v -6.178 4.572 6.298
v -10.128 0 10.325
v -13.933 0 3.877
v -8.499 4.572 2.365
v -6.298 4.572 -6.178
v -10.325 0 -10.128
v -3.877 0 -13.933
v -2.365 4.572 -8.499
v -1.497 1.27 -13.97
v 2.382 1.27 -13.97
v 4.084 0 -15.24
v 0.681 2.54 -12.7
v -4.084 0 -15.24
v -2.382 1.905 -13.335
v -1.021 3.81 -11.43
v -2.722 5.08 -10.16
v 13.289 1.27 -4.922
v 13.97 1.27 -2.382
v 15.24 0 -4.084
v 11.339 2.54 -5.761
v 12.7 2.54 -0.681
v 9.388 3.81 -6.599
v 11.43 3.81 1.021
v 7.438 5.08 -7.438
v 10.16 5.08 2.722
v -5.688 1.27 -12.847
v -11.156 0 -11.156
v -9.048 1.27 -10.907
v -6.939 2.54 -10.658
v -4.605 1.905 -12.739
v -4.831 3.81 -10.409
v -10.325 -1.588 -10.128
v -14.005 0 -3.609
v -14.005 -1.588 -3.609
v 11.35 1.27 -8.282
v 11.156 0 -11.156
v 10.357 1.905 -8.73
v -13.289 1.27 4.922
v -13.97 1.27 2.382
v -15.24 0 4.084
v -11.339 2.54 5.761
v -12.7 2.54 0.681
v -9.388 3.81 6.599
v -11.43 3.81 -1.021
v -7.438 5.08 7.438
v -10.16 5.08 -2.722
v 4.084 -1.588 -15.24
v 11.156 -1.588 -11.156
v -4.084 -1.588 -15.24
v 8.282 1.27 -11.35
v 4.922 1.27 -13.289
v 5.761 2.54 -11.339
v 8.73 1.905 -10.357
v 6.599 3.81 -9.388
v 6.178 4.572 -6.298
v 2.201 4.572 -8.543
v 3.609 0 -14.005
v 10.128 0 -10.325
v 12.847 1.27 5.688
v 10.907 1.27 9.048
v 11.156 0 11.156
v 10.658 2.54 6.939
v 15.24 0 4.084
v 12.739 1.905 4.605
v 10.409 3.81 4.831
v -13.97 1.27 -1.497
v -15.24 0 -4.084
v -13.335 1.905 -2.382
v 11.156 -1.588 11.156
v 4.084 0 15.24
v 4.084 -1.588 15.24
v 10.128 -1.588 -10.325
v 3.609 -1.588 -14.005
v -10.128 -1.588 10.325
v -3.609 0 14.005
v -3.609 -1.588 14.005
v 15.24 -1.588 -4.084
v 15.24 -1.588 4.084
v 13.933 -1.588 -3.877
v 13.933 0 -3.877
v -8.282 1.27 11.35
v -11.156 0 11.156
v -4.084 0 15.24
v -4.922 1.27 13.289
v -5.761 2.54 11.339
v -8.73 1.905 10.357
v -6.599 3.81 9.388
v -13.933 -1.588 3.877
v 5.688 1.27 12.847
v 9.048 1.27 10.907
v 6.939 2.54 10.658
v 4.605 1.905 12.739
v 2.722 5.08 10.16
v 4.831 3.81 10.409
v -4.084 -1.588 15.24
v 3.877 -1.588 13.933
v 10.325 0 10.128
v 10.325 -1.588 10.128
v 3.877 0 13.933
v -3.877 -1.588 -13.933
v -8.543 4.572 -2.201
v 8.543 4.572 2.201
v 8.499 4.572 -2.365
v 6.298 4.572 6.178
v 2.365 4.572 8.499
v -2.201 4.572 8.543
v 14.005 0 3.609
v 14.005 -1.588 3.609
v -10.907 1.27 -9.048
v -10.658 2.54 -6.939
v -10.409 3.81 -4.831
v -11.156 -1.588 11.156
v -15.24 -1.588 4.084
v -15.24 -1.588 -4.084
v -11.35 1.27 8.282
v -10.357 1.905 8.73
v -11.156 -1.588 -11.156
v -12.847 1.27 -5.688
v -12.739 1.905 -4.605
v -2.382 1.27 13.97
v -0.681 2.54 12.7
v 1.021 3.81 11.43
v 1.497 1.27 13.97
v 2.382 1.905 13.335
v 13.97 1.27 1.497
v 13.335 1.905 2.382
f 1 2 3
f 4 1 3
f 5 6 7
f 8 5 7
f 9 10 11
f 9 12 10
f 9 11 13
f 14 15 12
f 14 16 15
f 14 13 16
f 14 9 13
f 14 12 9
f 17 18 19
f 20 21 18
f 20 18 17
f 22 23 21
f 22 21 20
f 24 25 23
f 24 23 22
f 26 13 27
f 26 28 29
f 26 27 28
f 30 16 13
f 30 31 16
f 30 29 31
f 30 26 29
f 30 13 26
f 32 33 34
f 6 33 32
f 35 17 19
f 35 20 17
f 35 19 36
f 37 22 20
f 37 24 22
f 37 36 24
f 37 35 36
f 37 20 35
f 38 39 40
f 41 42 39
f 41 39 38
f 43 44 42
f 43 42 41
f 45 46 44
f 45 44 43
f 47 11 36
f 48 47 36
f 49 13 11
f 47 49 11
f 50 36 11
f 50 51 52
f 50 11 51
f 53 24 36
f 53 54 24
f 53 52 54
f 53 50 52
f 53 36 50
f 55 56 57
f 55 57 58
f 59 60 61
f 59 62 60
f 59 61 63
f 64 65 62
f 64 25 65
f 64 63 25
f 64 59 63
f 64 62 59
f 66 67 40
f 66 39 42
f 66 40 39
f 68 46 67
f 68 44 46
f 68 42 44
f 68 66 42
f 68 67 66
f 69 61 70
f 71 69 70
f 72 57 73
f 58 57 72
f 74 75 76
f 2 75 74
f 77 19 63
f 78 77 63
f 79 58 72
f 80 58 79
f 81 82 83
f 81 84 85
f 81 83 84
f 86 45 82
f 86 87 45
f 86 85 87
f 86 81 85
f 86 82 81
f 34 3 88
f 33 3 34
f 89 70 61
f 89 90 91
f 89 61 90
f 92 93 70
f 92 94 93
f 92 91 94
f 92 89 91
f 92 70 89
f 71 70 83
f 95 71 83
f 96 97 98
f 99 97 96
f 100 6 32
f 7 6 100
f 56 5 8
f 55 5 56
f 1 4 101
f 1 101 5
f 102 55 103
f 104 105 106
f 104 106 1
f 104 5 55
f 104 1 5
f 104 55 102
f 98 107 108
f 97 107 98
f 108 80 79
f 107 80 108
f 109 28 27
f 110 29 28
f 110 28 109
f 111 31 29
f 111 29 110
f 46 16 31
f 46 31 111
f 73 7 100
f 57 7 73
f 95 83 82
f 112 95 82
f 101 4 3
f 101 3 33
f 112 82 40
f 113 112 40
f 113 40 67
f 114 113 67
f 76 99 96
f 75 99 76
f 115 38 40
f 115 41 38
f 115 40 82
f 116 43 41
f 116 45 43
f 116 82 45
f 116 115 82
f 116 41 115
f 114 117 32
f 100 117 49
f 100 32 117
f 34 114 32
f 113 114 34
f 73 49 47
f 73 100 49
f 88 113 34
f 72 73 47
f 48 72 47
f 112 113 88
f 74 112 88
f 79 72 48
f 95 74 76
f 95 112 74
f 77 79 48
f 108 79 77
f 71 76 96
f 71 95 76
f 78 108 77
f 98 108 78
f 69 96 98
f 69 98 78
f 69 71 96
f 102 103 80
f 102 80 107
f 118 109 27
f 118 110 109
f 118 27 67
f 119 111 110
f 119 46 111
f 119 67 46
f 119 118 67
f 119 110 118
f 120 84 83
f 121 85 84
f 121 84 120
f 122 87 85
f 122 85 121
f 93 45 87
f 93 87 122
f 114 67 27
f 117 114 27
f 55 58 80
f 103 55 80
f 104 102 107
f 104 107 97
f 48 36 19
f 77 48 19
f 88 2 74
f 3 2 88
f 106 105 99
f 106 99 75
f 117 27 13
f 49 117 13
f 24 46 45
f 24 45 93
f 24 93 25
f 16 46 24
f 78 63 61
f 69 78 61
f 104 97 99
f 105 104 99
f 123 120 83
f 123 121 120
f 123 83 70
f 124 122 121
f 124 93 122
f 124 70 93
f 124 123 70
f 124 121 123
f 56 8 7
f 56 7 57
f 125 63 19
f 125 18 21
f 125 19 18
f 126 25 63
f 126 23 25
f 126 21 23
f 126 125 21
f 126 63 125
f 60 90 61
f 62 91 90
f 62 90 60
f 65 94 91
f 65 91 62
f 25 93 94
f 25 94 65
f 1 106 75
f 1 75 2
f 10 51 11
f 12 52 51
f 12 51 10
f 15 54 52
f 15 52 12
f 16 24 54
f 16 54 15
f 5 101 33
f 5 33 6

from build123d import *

# Parameters (mm, degrees)
BOSS_EXTRUDE2_DEPTH = 5.08
BOSS_EXTRUDE2_TAPER = 45
CUT_EXTRUDE1_DEPTH  = 28.788825452
CIRPATTERN1_COUNT   = 6
CUT_EXTRUDE2_DEPTH  = 4.572
CUT_EXTRUDE2_DRAFT  = -50
BOSS_EXTRUDE3_DEPTH = 1.5875


with BuildPart() as part:
    # Sketch2 → Boss-Extrude2 (new body)
    with BuildSketch(Plane(origin=(0, 0, 0), x_dir=(1, 0, 0), z_dir=(0, 1, 0))):
        Polygon((-11.156454307, -11.156454307), (-4.083545693, -15.24), (4.083545693, -15.24), (11.156454307, -11.156454307), (15.24, -4.083545693), (15.24, 4.083545693), (11.156454307, 11.156454307), (4.083545693, 15.24), (-4.083545693, 15.24), (-11.156454307, 11.156454307), (-15.24, 4.083545693), (-15.24, -4.083545693), align=None)
    extrude(amount=BOSS_EXTRUDE2_DEPTH, taper=BOSS_EXTRUDE2_TAPER)

    # Sketch3 → Cut-Extrude1 (cut, through all)
    with BuildSketch(Plane(origin=(-1.499582091, 7.605575605, 5.596516554), x_dir=(-0.9876151240341646, -0.12385705516936496, -0.09631093740460966), z_dir=(0.15684209814252395, -0.795471246716067, -0.5853426790336042))):
        Polygon((-4.296360621, -5.154612088), (6.000002448, -3.004781355), (2.5651928, -12.285691151), align=None)
    cut_extrude1 = extrude(amount=-CUT_EXTRUDE1_DEPTH, mode=Mode.SUBTRACT)

    # CirPattern1: Cut-Extrude1 ×6 about axis
    cirpattern1_axis = Axis((0, 0, 0), (0, 1, 0))
    for i in range(1, CIRPATTERN1_COUNT):
        add(cut_extrude1.rotate(cirpattern1_axis, i * 360 / CIRPATTERN1_COUNT), mode=Mode.SUBTRACT)


with BuildPart() as cut_extrude2_tool:
    # Sketch5 → Cut-Extrude2 (with draft: the straight prism first)
    with BuildSketch(Plane.XZ):
        Polygon((13.933401039, -3.877261622), (14.005310072, 3.608893457), (10.324507581, 10.12804845), (3.877261622, 13.933401039), (-3.608893457, 14.005310072), (-10.12804845, 10.324507581), (-13.933401039, 3.877261622), (-14.005310072, -3.608893457), (-10.324507581, -10.12804845), (-3.877261622, -13.933401039), (3.608893457, -14.005310072), (10.12804845, -10.324507581), align=None)
    extrude(amount=-CUT_EXTRUDE2_DEPTH)
    # Cut-Extrude2: the draft: its side faces are tilted about the plane it starts from
    cut_extrude2_sides = [cut_extrude2_tool.faces().sort_by_distance(p)[0] for p in [
        (13.969355555, 2.286, -0.134184083),
        (12.164908827, 2.286, 6.868470953),
        (7.100884602, 2.286, 12.030724744),
        (0.134184083, 2.286, 13.969355555),
        (-6.868470953, 2.286, 12.164908827),
        (-12.030724744, 2.286, 7.100884602),
        (-13.969355555, 2.286, 0.134184083),
        (-12.164908827, 2.286, -6.868470953),
        (-7.100884602, 2.286, -12.030724744),
        (-0.134184083, 2.286, -13.969355555),
        (6.868470953, 2.286, -12.164908827),
        (12.030724744, 2.286, -7.100884602),
    ]]
    draft(cut_extrude2_sides, Plane.XZ, CUT_EXTRUDE2_DRAFT)


with BuildPart() as part_1:
    add(part.part)

    # Cut-Extrude2: cut by cut_extrude2_tool
    add(cut_extrude2_tool.part, mode=Mode.SUBTRACT)

    # Sketch8 → Boss-Extrude3 (add)
    with BuildSketch(Plane.XZ):
        Polygon((-15.24, -4.083545693), (-11.156454307, -11.156454307), (-4.083545693, -15.24), (4.083545693, -15.24), (11.156454307, -11.156454307), (15.24, -4.083545693), (15.24, 4.083545693), (11.156454307, 11.156454307), (4.083545693, 15.24), (-4.083545693, 15.24), (-11.156454307, 11.156454307), (-15.24, 4.083545693), align=None)
        Polygon((-10.12804845, 10.324507581), (-13.933401039, 3.877261622), (-14.005310072, -3.608893457), (-10.324507581, -10.12804845), (-3.877261622, -13.933401039), (3.608893457, -14.005310072), (10.12804845, -10.324507581), (13.933401039, -3.877261622), (14.005310072, 3.608893457), (10.324507581, 10.12804845), (3.877261622, 13.933401039), (-3.608893457, 14.005310072), align=None, mode=Mode.SUBTRACT)
    extrude(amount=BOSS_EXTRUDE3_DEPTH)


solid = part_1.part
